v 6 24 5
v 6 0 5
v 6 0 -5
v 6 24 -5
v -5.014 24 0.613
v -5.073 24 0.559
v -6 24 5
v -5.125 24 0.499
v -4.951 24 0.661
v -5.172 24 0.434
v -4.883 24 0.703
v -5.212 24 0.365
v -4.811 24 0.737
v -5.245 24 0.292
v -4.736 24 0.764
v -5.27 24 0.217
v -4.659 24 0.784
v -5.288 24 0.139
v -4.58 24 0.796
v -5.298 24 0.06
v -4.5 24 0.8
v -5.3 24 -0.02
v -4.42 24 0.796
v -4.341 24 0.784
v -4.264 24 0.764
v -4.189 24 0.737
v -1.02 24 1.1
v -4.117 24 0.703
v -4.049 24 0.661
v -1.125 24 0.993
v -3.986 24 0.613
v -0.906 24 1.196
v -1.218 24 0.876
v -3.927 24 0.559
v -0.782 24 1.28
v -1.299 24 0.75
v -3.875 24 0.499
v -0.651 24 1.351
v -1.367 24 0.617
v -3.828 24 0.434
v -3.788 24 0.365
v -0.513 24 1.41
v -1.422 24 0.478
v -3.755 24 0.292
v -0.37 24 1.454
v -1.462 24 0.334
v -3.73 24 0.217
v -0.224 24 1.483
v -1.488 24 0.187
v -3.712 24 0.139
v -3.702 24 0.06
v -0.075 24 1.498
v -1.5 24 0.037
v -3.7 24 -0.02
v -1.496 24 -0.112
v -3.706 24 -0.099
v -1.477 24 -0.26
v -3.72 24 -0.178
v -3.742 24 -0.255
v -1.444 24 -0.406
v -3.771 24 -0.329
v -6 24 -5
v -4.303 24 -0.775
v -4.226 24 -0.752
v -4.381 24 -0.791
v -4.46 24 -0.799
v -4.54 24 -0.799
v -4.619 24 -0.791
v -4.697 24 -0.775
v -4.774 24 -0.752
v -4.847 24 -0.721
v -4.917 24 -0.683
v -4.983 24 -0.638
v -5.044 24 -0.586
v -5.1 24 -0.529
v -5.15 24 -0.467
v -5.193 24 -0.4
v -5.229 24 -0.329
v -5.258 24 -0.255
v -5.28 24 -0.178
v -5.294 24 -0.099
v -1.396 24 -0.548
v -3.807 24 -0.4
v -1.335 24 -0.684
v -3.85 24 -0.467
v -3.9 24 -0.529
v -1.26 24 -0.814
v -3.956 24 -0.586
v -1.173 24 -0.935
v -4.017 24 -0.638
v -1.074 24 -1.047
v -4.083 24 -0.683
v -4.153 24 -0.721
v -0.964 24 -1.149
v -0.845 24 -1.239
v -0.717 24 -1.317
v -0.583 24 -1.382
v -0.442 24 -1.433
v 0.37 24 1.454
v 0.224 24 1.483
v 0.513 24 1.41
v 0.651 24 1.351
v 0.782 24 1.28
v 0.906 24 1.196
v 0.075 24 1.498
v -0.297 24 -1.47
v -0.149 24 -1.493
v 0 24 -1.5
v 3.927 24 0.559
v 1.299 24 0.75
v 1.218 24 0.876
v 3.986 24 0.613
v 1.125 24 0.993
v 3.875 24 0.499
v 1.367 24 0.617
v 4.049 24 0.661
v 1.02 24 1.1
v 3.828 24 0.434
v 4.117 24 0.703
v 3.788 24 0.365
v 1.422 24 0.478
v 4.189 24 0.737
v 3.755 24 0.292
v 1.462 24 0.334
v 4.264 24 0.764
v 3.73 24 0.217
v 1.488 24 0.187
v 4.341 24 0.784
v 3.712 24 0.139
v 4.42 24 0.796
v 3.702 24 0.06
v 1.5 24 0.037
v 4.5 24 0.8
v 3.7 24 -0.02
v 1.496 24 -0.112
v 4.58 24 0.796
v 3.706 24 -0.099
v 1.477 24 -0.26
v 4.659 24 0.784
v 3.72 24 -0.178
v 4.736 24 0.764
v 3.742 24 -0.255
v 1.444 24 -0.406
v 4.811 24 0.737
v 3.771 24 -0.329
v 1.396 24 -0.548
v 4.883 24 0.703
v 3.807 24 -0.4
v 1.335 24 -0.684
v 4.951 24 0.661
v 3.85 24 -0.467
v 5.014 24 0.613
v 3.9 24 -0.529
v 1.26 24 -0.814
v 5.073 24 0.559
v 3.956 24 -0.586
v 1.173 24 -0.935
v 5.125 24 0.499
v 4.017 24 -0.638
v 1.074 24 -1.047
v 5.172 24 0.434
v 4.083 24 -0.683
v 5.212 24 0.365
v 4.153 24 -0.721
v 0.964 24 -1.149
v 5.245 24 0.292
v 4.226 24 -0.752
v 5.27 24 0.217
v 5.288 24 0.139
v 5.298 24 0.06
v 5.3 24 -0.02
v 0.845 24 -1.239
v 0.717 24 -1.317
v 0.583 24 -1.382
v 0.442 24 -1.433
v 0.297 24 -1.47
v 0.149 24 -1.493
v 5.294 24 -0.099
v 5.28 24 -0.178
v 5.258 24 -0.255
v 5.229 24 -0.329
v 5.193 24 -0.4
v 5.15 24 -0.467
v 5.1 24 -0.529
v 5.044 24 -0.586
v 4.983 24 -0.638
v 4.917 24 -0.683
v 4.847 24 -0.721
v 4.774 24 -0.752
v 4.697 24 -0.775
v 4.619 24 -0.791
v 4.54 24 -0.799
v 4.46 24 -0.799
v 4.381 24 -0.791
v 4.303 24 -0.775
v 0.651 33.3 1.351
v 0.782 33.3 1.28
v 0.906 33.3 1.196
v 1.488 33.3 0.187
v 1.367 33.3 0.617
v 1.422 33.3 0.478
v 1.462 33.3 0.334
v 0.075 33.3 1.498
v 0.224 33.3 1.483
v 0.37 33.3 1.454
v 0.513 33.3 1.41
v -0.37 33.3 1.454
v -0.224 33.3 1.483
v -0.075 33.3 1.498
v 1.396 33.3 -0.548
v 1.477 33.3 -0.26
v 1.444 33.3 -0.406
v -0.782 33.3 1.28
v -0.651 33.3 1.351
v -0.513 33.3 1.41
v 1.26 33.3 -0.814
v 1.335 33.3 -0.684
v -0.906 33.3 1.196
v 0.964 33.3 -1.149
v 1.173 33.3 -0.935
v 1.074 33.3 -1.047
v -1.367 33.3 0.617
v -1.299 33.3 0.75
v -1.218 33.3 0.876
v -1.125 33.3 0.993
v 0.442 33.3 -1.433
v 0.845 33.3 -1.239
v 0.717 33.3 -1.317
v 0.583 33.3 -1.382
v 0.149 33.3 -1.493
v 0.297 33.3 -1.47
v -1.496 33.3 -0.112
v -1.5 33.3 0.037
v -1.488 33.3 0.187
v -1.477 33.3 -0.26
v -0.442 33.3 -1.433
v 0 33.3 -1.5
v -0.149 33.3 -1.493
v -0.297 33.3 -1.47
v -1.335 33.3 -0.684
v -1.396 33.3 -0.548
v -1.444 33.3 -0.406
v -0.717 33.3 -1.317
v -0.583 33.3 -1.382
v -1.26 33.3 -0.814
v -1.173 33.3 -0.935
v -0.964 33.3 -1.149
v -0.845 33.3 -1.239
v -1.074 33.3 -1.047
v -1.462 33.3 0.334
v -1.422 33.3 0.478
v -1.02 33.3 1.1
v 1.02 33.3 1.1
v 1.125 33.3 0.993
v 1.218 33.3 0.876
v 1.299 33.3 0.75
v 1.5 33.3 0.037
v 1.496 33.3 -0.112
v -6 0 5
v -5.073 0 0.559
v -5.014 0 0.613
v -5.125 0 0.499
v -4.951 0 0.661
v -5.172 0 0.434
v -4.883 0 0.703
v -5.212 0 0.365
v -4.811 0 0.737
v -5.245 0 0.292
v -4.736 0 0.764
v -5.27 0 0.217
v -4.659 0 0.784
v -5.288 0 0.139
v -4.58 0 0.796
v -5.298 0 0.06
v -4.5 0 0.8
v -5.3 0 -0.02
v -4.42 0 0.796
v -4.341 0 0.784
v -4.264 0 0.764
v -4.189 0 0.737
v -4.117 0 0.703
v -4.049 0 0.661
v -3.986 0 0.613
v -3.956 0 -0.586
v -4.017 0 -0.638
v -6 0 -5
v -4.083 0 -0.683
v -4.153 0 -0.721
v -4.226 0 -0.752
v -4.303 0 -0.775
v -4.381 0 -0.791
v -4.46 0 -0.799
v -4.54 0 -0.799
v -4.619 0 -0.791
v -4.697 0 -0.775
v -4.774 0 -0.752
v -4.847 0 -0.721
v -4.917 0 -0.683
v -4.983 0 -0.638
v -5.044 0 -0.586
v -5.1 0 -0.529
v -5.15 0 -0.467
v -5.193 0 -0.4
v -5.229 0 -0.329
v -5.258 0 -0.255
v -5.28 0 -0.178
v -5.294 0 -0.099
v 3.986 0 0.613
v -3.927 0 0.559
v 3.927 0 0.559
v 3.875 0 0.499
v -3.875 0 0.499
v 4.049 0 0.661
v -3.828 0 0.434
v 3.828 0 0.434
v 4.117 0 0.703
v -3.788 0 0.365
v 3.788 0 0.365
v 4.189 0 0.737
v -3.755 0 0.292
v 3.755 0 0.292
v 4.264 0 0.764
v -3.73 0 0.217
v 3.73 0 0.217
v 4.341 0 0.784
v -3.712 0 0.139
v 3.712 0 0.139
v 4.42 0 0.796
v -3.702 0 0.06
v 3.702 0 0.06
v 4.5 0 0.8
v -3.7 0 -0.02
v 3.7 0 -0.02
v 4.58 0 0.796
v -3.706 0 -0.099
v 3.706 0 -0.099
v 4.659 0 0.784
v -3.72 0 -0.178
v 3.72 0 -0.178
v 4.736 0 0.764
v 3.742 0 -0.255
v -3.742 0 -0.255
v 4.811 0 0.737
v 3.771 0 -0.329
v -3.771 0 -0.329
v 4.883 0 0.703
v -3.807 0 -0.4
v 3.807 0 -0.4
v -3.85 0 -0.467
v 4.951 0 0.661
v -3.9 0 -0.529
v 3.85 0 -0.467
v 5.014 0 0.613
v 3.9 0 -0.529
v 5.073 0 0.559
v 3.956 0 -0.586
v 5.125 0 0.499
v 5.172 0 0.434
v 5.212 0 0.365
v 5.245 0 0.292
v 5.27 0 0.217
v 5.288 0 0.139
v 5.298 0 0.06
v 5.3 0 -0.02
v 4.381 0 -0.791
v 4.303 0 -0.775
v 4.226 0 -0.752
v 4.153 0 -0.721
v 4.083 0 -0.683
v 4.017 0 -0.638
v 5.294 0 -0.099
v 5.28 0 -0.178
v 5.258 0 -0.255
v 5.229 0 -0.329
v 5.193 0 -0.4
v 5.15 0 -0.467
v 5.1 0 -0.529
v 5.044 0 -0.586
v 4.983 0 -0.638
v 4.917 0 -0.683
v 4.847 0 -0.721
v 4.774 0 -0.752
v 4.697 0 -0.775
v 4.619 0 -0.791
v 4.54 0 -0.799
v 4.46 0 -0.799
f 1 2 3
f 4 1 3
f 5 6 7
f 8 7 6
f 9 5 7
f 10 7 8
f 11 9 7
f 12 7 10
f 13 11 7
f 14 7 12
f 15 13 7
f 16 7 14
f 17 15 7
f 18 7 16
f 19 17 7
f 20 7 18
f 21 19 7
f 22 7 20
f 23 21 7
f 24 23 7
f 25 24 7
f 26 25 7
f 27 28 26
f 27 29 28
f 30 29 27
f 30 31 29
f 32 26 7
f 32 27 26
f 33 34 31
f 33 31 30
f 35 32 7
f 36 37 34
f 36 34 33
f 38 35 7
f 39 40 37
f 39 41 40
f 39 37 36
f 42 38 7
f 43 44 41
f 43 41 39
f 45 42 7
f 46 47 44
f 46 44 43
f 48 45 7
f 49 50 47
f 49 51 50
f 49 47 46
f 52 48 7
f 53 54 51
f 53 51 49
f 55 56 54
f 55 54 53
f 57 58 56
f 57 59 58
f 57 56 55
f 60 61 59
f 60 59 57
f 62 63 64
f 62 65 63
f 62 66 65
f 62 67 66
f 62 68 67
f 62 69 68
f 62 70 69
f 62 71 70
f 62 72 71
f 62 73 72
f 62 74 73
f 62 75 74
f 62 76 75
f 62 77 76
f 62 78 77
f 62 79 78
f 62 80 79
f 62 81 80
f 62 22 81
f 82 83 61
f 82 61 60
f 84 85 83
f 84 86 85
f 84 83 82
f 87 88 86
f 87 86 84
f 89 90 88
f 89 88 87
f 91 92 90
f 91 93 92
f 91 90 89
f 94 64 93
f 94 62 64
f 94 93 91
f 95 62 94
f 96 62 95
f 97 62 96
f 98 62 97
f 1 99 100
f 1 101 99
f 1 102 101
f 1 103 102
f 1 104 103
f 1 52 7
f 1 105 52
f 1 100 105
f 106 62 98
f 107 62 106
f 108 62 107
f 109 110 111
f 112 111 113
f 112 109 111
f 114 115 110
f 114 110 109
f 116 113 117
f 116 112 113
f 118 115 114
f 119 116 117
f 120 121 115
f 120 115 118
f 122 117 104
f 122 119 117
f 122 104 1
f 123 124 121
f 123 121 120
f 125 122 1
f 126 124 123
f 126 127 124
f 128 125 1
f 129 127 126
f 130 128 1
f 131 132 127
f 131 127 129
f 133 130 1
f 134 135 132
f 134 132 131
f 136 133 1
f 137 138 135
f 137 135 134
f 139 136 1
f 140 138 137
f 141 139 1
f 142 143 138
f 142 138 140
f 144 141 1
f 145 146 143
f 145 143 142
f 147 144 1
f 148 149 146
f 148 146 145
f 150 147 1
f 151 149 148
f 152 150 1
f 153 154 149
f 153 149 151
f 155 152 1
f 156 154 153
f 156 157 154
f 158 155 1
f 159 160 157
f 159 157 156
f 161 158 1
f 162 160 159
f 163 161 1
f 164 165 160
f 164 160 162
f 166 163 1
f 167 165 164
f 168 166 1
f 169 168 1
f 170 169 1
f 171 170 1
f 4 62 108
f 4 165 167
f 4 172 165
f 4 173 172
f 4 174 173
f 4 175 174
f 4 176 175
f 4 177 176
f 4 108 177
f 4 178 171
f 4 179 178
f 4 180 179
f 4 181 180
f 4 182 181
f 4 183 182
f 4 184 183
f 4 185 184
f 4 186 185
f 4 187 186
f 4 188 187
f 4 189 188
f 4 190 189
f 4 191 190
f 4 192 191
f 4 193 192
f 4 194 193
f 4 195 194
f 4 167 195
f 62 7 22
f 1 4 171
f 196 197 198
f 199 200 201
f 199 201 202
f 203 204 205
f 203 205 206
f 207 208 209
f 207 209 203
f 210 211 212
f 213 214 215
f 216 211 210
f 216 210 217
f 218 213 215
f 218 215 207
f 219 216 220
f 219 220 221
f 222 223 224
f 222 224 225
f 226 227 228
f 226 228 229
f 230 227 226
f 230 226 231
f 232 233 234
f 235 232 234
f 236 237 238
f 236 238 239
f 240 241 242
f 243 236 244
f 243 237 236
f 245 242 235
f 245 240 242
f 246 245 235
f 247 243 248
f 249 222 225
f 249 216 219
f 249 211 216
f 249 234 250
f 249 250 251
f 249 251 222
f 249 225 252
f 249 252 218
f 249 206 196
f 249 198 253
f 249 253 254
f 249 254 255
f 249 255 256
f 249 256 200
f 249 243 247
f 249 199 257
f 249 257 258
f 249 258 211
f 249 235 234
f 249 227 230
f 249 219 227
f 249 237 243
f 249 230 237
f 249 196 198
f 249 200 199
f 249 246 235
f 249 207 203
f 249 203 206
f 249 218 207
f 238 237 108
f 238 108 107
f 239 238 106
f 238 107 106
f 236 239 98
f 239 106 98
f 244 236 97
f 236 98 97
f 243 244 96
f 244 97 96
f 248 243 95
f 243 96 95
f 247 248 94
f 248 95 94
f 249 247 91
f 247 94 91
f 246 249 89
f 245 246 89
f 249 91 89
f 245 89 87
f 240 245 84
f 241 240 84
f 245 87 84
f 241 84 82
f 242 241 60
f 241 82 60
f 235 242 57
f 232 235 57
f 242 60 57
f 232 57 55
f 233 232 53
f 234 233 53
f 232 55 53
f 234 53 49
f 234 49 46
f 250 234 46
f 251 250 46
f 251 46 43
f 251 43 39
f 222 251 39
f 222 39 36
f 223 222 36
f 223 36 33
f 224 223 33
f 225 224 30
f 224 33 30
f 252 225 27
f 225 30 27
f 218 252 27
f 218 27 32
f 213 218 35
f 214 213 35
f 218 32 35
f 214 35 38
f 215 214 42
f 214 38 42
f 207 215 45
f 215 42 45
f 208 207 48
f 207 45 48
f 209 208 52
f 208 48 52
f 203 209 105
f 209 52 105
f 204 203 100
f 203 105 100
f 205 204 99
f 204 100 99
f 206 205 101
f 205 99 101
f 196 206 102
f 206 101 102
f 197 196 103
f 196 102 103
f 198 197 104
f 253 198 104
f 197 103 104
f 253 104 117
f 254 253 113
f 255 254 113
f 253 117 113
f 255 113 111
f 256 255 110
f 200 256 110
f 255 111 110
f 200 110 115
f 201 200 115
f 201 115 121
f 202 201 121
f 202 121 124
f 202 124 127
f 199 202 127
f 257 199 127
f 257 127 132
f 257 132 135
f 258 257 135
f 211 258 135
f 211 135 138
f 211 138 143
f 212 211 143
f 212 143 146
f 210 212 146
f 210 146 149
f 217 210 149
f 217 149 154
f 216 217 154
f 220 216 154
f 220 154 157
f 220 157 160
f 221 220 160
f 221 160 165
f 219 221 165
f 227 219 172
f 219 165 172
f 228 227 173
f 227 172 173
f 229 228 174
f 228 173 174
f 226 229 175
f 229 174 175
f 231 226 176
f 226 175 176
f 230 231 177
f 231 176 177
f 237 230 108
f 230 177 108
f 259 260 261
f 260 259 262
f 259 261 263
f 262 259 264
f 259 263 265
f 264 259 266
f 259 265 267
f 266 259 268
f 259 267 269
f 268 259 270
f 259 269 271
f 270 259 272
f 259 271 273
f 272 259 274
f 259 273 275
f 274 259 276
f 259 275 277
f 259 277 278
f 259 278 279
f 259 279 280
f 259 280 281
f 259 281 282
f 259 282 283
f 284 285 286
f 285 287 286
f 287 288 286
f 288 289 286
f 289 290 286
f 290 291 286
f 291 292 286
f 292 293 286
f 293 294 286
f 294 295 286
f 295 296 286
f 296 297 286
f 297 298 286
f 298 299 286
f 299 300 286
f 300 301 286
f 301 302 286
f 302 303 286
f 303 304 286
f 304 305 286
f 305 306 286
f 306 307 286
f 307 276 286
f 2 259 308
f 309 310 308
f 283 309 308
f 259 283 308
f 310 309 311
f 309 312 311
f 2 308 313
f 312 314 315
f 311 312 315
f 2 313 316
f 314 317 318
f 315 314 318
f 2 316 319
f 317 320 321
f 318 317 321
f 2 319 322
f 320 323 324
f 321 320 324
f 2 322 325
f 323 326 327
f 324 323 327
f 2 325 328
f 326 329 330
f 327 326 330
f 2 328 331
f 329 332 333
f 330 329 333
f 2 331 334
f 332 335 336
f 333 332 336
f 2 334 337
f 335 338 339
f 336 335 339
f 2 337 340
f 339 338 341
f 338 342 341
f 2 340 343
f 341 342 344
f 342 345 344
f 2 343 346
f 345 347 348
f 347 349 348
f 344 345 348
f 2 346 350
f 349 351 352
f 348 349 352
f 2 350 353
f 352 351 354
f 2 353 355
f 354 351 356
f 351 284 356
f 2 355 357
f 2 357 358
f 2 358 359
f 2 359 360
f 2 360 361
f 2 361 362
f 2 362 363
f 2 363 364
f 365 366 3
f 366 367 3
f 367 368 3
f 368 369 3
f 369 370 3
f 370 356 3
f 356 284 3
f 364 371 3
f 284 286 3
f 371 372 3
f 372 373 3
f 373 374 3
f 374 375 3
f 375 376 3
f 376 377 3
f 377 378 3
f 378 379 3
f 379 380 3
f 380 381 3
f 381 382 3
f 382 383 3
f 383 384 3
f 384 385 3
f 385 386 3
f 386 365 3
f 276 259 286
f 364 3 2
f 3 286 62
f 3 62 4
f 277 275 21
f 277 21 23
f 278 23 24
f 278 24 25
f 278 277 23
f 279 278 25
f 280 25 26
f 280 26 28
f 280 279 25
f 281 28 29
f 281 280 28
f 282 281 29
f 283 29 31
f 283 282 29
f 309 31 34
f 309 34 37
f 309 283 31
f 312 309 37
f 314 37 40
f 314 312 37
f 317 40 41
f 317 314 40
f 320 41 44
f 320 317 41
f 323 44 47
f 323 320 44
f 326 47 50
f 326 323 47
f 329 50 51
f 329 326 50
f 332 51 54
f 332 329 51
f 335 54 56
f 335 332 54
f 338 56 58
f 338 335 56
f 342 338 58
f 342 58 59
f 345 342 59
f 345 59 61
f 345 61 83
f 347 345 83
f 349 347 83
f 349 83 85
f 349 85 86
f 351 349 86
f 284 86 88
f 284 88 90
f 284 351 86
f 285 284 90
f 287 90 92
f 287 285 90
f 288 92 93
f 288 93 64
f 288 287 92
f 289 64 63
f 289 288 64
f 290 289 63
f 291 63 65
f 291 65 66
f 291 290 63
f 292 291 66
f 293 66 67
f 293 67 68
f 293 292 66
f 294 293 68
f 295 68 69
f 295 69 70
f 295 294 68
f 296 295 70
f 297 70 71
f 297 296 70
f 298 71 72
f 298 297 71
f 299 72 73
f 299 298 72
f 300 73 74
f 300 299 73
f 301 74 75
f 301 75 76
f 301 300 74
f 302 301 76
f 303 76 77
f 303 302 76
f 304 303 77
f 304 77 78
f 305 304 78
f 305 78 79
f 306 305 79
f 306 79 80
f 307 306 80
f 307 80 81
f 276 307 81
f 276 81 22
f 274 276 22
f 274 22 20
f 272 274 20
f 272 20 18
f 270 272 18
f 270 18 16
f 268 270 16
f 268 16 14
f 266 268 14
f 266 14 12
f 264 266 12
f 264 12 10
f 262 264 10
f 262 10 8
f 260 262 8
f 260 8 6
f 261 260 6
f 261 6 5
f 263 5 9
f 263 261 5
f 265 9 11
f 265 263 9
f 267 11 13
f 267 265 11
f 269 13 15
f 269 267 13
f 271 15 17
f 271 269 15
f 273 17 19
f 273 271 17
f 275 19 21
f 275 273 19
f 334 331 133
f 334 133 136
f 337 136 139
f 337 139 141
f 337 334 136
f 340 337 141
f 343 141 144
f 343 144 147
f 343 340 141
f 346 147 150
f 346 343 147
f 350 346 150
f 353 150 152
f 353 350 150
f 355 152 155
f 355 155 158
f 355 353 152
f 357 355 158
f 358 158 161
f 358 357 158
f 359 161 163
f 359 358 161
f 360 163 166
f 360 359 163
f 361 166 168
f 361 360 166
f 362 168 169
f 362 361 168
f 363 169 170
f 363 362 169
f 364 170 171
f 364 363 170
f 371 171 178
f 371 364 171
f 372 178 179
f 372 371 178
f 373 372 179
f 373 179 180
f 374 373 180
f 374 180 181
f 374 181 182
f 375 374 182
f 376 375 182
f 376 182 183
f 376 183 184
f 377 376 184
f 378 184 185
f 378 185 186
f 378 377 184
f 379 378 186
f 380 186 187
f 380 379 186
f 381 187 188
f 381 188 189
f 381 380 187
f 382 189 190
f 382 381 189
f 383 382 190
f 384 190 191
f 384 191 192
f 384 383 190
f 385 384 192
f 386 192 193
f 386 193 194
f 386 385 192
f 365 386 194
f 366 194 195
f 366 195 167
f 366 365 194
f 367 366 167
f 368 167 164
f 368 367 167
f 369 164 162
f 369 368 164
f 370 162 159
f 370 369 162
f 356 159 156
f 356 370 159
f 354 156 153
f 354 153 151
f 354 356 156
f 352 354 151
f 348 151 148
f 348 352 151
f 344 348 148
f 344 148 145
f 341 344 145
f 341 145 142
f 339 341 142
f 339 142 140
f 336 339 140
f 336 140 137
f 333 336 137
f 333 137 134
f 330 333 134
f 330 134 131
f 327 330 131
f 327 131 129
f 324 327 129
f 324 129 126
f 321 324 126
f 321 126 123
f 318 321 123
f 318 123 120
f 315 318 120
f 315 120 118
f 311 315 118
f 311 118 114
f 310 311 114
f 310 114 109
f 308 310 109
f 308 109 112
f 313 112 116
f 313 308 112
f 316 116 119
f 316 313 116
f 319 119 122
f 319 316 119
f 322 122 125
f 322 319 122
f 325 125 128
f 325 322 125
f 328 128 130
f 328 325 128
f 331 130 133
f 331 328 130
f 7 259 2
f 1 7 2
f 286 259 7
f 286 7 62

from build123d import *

# Parameters (mm, degrees)
SKETCH_1_W      = 12
SKETCH_1_H      = 10
SKETCH_1_R      = 0.8
EXTRUDE_1_DEPTH = 24
SKETCH_2_R      = 1.5
EXTRUDE_2_DEPTH = 9.3


with BuildPart() as part:
    # 스케치1 → 보스-돌출1 (new body)
    with BuildSketch(Plane(origin=(0, 0, 0), x_dir=(1, 0, 0), z_dir=(0, 1, 0))):
        Rectangle(SKETCH_1_W, SKETCH_1_H)
        with Locations(Location((4.5, 0, 0), (0, 0, 270))):
            Circle(SKETCH_1_R, mode=Mode.SUBTRACT)
        with Locations(Location((-4.5, 0, 0), (0, 0, 270))):
            Circle(SKETCH_1_R, mode=Mode.SUBTRACT)
    extrude(amount=EXTRUDE_1_DEPTH)

    # 스케치2 → 보스-돌출2 (add)
    with BuildSketch(Plane(origin=(0, 24, 0), x_dir=(1, 0, 0), z_dir=(0, 1, 0))):
        with Locations(Location((0, 0, 0), (0, 0, 90))):
            Circle(SKETCH_2_R)
    extrude(amount=EXTRUDE_2_DEPTH)


solid = part.part
